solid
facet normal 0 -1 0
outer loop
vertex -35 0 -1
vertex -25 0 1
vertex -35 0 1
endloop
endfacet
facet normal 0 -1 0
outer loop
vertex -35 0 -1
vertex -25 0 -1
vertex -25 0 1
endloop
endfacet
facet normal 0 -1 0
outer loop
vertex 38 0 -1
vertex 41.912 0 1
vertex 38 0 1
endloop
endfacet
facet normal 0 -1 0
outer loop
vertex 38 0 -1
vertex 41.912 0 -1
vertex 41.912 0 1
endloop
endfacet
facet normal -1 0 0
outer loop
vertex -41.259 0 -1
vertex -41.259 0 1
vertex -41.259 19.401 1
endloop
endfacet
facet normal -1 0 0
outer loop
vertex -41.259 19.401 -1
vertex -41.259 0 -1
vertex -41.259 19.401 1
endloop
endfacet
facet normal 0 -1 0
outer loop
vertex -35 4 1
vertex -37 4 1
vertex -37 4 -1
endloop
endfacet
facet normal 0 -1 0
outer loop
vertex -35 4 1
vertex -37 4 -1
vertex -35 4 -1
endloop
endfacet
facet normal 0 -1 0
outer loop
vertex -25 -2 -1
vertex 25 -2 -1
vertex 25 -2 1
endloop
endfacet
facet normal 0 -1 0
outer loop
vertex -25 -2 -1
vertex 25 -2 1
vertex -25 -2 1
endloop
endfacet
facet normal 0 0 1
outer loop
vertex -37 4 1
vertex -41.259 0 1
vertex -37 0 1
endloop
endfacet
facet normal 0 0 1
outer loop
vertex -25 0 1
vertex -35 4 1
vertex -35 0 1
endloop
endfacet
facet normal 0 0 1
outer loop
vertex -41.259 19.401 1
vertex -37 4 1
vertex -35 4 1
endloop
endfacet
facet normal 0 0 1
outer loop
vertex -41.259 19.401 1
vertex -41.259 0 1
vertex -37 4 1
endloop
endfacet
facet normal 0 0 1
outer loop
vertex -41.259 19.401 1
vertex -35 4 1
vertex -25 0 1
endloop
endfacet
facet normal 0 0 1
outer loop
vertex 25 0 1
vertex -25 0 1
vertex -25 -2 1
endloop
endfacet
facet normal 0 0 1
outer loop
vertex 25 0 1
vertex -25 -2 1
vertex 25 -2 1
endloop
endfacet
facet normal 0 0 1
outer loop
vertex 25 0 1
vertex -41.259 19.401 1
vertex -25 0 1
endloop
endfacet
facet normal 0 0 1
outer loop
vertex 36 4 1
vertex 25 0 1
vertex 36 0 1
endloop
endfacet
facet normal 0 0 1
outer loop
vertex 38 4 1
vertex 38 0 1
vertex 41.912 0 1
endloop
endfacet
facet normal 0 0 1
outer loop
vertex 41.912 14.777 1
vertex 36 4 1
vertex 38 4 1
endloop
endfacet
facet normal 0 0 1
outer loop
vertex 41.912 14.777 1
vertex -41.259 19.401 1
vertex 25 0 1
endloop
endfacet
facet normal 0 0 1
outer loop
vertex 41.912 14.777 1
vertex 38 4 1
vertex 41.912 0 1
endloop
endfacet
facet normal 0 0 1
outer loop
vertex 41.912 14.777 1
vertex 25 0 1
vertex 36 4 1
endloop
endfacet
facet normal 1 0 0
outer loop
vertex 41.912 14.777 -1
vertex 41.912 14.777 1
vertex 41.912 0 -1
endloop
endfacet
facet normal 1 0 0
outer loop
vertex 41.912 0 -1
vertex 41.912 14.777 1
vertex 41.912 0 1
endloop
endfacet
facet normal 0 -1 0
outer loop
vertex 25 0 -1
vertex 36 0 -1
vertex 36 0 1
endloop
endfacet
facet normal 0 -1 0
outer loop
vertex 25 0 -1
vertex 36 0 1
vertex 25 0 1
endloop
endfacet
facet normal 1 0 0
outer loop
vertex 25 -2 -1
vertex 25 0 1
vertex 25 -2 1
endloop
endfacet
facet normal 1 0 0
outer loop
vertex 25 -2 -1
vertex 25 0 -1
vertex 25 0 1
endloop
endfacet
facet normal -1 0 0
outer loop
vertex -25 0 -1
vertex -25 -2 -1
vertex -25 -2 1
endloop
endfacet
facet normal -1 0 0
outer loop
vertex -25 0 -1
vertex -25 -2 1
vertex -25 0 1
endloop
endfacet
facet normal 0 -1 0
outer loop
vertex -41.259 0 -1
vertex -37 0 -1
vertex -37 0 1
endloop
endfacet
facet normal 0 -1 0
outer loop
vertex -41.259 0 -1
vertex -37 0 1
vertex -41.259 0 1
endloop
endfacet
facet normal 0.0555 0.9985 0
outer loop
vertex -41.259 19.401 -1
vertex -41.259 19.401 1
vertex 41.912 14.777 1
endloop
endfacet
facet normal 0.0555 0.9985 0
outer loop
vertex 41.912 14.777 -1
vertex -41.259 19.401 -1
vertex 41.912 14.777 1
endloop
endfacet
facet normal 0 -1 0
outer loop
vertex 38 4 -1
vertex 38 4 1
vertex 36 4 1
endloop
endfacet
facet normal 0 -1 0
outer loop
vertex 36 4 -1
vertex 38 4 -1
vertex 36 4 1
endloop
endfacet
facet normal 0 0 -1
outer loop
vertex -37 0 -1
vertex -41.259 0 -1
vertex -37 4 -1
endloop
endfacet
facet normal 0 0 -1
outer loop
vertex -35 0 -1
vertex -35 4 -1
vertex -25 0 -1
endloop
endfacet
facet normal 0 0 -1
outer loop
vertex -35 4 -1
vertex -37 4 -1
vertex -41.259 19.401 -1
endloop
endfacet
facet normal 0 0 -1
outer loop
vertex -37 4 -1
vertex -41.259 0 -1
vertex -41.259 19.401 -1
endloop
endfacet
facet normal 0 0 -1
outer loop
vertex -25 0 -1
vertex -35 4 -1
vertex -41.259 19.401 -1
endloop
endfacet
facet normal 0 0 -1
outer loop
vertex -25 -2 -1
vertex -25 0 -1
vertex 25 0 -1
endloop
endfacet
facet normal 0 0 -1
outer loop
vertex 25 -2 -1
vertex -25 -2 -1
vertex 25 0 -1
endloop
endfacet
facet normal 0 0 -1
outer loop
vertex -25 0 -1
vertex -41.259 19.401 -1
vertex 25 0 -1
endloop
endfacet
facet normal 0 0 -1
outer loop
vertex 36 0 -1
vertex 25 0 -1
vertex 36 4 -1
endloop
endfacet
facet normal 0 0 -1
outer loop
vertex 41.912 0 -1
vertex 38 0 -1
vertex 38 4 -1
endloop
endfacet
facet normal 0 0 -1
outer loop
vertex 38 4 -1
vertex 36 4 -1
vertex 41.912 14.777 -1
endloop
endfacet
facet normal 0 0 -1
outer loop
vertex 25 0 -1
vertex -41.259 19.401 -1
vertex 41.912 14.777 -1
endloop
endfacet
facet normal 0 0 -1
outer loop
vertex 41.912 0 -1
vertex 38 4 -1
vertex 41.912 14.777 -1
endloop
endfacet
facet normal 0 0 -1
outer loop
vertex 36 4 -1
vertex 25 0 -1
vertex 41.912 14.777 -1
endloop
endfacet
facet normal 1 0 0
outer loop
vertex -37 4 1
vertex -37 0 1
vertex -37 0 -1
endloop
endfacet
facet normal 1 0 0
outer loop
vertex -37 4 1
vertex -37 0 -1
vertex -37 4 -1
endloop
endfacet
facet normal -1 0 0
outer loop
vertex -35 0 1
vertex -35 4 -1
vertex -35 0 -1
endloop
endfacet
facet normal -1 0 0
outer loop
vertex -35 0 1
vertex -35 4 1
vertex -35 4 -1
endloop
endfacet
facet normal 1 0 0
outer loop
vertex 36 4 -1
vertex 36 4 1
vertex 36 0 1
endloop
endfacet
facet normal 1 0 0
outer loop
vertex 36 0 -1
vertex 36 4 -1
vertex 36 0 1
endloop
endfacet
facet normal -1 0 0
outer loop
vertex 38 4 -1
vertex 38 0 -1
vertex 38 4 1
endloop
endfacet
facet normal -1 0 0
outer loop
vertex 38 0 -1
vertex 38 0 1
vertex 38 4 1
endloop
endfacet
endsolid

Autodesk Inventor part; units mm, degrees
ref_plane "YZ Plane" through (0, 0, 0) normal (1, 0, 0) x (0, 1, 0)
ref_plane "XZ Plane" through (0, 0, 0) normal (0, 1, 0) x (-1, 0, 0)
ref_plane "XY Plane" through (0, 0, 0) normal (0, 0, 1) x (1, 0, 0)
sketch "Sketch1" plane through (0, 0, 0) normal (0, 0, 1) x (1, 0, 0)
  line L0 (-64, 50) -> (64, 50)
  line L1 (64, 50) -> (64, 0)
  line L2 (64, 0) -> (-64, 0)
  line L3 (-64, 0) -> (-64, 50)
  line L4 (-25, 0) -> (25, 0)
  line L5 (25, 0) -> (25, -2)
  line L6 (25, -2) -> (-25, -2)
  line L7 (-25, -2) -> (-25, 0)
  point P0 (0, 0)
  point P1 (0, 0)
  dimension "d0" = 50
  dimension "d1" = 128
  dimension "d2" = 2
  dimension "d3" = 50
extrude "Extrusion1" add sketch "Sketch1" along normal mid plane 2
sketch "Sketch2" plane through (0, 0, 1) normal (0, 0, 1) x (1, 0, 0)
  line L0 (-37.004, 19.1647) -> (37.8795, 15.001) projected
  line L1 (37.8795, 15.001) -> (37.8795, 6.0072) projected
  line L2 (37.8795, 6.0072) -> (-37.004, 10.1709) projected
  line L3 (-37.004, 10.1709) -> (-37.004, 19.1647) projected
  line L4 (-41.259, 17.7892) -> (-41.259, 8.0268) projected
  line L5 (41.9117, 3.4023) -> (41.9117, 13.1647) projected
  point P0 (0, 0)
sketch "Sketch3" plane through (0, 0, 1) normal (0, 0, 1) x (1, 0, 0)
  line L0 (-41.259, 17.7892) -> (-41.259, 8.0268) construction
  line L1 (-37.004, 19.1647) -> (37.8795, 15.001) construction
  line L2 (41.9117, 3.4023) -> (41.9117, 13.1647) construction
  line L3 (-41.259, 19.4013) -> (41.9117, 14.7768)
  line L4 (41.9117, 14.7768) -> (41.9117, 0)
  line L5 (91.9117, 0) -> (91.9117, 60)
  line L6 (91.9117, 60) -> (-91.259, 60)
  line L7 (-91.259, 60) -> (-91.259, 0)
  line L8 (-91.259, 0) -> (-41.259, 0)
  line L9 (-41.259, 0) -> (-41.259, 19.4013)
  line L10 (41.9117, 0) -> (91.9117, 0)
  point P0 (0, 0)
  dimension "d6" = 60
  dimension "d7" = 50
  dimension "d8" = 50
extrude "Extrusion2" cut sketch "Sketch3" against normal through all
sketch "Sketch4" plane through (0, 0, 1) normal (0, 0, 1) x (1, 0, 0)
  line L0 (36, 15.6306) -> (36, 0) projected
  line L1 (38, 15.6306) -> (36, 15.6306) projected
  line L2 (38, 0) -> (38, 15.6306) projected
  line L3 (36, 0) -> (38, 0) projected
  line L4 (-37, 19.7943) -> (-37, 0) projected
  line L5 (-35, 19.7943) -> (-37, 19.7943) projected
  line L6 (-35, 0) -> (-35, 19.7943) projected
  line L7 (-37, 0) -> (-35, 0) projected
  point P0 (0, 0)
sketch "Sketch5" plane through (0, 0, 1) normal (0, 0, 1) x (1, 0, 0)
  line L0 (-37, 19.7943) -> (-37, 0) construction
  line L1 (-35, 0) -> (-35, 19.7943) construction
  line L2 (36, 15.6306) -> (36, 0) construction
  line L3 (38, 0) -> (38, 15.6306) construction
  line L4 (-37, 4) -> (-35, 4)
  line L5 (-35, 4) -> (-35, 0)
  line L6 (-35, 0) -> (-37, 0)
  line L7 (-37, 0) -> (-37, 4)
  line L8 (38, 4) -> (36, 4)
  line L9 (36, 4) -> (36, 0)
  line L10 (36, 0) -> (38, 0)
  line L11 (38, 0) -> (38, 4)
  point P0 (0, 0)
  dimension "d11" = 4
  dimension "d12" = 4
extrude "Extrusion3" cut sketch "Sketch5" against normal through all
properties part number "angle_plate_short_tall"
